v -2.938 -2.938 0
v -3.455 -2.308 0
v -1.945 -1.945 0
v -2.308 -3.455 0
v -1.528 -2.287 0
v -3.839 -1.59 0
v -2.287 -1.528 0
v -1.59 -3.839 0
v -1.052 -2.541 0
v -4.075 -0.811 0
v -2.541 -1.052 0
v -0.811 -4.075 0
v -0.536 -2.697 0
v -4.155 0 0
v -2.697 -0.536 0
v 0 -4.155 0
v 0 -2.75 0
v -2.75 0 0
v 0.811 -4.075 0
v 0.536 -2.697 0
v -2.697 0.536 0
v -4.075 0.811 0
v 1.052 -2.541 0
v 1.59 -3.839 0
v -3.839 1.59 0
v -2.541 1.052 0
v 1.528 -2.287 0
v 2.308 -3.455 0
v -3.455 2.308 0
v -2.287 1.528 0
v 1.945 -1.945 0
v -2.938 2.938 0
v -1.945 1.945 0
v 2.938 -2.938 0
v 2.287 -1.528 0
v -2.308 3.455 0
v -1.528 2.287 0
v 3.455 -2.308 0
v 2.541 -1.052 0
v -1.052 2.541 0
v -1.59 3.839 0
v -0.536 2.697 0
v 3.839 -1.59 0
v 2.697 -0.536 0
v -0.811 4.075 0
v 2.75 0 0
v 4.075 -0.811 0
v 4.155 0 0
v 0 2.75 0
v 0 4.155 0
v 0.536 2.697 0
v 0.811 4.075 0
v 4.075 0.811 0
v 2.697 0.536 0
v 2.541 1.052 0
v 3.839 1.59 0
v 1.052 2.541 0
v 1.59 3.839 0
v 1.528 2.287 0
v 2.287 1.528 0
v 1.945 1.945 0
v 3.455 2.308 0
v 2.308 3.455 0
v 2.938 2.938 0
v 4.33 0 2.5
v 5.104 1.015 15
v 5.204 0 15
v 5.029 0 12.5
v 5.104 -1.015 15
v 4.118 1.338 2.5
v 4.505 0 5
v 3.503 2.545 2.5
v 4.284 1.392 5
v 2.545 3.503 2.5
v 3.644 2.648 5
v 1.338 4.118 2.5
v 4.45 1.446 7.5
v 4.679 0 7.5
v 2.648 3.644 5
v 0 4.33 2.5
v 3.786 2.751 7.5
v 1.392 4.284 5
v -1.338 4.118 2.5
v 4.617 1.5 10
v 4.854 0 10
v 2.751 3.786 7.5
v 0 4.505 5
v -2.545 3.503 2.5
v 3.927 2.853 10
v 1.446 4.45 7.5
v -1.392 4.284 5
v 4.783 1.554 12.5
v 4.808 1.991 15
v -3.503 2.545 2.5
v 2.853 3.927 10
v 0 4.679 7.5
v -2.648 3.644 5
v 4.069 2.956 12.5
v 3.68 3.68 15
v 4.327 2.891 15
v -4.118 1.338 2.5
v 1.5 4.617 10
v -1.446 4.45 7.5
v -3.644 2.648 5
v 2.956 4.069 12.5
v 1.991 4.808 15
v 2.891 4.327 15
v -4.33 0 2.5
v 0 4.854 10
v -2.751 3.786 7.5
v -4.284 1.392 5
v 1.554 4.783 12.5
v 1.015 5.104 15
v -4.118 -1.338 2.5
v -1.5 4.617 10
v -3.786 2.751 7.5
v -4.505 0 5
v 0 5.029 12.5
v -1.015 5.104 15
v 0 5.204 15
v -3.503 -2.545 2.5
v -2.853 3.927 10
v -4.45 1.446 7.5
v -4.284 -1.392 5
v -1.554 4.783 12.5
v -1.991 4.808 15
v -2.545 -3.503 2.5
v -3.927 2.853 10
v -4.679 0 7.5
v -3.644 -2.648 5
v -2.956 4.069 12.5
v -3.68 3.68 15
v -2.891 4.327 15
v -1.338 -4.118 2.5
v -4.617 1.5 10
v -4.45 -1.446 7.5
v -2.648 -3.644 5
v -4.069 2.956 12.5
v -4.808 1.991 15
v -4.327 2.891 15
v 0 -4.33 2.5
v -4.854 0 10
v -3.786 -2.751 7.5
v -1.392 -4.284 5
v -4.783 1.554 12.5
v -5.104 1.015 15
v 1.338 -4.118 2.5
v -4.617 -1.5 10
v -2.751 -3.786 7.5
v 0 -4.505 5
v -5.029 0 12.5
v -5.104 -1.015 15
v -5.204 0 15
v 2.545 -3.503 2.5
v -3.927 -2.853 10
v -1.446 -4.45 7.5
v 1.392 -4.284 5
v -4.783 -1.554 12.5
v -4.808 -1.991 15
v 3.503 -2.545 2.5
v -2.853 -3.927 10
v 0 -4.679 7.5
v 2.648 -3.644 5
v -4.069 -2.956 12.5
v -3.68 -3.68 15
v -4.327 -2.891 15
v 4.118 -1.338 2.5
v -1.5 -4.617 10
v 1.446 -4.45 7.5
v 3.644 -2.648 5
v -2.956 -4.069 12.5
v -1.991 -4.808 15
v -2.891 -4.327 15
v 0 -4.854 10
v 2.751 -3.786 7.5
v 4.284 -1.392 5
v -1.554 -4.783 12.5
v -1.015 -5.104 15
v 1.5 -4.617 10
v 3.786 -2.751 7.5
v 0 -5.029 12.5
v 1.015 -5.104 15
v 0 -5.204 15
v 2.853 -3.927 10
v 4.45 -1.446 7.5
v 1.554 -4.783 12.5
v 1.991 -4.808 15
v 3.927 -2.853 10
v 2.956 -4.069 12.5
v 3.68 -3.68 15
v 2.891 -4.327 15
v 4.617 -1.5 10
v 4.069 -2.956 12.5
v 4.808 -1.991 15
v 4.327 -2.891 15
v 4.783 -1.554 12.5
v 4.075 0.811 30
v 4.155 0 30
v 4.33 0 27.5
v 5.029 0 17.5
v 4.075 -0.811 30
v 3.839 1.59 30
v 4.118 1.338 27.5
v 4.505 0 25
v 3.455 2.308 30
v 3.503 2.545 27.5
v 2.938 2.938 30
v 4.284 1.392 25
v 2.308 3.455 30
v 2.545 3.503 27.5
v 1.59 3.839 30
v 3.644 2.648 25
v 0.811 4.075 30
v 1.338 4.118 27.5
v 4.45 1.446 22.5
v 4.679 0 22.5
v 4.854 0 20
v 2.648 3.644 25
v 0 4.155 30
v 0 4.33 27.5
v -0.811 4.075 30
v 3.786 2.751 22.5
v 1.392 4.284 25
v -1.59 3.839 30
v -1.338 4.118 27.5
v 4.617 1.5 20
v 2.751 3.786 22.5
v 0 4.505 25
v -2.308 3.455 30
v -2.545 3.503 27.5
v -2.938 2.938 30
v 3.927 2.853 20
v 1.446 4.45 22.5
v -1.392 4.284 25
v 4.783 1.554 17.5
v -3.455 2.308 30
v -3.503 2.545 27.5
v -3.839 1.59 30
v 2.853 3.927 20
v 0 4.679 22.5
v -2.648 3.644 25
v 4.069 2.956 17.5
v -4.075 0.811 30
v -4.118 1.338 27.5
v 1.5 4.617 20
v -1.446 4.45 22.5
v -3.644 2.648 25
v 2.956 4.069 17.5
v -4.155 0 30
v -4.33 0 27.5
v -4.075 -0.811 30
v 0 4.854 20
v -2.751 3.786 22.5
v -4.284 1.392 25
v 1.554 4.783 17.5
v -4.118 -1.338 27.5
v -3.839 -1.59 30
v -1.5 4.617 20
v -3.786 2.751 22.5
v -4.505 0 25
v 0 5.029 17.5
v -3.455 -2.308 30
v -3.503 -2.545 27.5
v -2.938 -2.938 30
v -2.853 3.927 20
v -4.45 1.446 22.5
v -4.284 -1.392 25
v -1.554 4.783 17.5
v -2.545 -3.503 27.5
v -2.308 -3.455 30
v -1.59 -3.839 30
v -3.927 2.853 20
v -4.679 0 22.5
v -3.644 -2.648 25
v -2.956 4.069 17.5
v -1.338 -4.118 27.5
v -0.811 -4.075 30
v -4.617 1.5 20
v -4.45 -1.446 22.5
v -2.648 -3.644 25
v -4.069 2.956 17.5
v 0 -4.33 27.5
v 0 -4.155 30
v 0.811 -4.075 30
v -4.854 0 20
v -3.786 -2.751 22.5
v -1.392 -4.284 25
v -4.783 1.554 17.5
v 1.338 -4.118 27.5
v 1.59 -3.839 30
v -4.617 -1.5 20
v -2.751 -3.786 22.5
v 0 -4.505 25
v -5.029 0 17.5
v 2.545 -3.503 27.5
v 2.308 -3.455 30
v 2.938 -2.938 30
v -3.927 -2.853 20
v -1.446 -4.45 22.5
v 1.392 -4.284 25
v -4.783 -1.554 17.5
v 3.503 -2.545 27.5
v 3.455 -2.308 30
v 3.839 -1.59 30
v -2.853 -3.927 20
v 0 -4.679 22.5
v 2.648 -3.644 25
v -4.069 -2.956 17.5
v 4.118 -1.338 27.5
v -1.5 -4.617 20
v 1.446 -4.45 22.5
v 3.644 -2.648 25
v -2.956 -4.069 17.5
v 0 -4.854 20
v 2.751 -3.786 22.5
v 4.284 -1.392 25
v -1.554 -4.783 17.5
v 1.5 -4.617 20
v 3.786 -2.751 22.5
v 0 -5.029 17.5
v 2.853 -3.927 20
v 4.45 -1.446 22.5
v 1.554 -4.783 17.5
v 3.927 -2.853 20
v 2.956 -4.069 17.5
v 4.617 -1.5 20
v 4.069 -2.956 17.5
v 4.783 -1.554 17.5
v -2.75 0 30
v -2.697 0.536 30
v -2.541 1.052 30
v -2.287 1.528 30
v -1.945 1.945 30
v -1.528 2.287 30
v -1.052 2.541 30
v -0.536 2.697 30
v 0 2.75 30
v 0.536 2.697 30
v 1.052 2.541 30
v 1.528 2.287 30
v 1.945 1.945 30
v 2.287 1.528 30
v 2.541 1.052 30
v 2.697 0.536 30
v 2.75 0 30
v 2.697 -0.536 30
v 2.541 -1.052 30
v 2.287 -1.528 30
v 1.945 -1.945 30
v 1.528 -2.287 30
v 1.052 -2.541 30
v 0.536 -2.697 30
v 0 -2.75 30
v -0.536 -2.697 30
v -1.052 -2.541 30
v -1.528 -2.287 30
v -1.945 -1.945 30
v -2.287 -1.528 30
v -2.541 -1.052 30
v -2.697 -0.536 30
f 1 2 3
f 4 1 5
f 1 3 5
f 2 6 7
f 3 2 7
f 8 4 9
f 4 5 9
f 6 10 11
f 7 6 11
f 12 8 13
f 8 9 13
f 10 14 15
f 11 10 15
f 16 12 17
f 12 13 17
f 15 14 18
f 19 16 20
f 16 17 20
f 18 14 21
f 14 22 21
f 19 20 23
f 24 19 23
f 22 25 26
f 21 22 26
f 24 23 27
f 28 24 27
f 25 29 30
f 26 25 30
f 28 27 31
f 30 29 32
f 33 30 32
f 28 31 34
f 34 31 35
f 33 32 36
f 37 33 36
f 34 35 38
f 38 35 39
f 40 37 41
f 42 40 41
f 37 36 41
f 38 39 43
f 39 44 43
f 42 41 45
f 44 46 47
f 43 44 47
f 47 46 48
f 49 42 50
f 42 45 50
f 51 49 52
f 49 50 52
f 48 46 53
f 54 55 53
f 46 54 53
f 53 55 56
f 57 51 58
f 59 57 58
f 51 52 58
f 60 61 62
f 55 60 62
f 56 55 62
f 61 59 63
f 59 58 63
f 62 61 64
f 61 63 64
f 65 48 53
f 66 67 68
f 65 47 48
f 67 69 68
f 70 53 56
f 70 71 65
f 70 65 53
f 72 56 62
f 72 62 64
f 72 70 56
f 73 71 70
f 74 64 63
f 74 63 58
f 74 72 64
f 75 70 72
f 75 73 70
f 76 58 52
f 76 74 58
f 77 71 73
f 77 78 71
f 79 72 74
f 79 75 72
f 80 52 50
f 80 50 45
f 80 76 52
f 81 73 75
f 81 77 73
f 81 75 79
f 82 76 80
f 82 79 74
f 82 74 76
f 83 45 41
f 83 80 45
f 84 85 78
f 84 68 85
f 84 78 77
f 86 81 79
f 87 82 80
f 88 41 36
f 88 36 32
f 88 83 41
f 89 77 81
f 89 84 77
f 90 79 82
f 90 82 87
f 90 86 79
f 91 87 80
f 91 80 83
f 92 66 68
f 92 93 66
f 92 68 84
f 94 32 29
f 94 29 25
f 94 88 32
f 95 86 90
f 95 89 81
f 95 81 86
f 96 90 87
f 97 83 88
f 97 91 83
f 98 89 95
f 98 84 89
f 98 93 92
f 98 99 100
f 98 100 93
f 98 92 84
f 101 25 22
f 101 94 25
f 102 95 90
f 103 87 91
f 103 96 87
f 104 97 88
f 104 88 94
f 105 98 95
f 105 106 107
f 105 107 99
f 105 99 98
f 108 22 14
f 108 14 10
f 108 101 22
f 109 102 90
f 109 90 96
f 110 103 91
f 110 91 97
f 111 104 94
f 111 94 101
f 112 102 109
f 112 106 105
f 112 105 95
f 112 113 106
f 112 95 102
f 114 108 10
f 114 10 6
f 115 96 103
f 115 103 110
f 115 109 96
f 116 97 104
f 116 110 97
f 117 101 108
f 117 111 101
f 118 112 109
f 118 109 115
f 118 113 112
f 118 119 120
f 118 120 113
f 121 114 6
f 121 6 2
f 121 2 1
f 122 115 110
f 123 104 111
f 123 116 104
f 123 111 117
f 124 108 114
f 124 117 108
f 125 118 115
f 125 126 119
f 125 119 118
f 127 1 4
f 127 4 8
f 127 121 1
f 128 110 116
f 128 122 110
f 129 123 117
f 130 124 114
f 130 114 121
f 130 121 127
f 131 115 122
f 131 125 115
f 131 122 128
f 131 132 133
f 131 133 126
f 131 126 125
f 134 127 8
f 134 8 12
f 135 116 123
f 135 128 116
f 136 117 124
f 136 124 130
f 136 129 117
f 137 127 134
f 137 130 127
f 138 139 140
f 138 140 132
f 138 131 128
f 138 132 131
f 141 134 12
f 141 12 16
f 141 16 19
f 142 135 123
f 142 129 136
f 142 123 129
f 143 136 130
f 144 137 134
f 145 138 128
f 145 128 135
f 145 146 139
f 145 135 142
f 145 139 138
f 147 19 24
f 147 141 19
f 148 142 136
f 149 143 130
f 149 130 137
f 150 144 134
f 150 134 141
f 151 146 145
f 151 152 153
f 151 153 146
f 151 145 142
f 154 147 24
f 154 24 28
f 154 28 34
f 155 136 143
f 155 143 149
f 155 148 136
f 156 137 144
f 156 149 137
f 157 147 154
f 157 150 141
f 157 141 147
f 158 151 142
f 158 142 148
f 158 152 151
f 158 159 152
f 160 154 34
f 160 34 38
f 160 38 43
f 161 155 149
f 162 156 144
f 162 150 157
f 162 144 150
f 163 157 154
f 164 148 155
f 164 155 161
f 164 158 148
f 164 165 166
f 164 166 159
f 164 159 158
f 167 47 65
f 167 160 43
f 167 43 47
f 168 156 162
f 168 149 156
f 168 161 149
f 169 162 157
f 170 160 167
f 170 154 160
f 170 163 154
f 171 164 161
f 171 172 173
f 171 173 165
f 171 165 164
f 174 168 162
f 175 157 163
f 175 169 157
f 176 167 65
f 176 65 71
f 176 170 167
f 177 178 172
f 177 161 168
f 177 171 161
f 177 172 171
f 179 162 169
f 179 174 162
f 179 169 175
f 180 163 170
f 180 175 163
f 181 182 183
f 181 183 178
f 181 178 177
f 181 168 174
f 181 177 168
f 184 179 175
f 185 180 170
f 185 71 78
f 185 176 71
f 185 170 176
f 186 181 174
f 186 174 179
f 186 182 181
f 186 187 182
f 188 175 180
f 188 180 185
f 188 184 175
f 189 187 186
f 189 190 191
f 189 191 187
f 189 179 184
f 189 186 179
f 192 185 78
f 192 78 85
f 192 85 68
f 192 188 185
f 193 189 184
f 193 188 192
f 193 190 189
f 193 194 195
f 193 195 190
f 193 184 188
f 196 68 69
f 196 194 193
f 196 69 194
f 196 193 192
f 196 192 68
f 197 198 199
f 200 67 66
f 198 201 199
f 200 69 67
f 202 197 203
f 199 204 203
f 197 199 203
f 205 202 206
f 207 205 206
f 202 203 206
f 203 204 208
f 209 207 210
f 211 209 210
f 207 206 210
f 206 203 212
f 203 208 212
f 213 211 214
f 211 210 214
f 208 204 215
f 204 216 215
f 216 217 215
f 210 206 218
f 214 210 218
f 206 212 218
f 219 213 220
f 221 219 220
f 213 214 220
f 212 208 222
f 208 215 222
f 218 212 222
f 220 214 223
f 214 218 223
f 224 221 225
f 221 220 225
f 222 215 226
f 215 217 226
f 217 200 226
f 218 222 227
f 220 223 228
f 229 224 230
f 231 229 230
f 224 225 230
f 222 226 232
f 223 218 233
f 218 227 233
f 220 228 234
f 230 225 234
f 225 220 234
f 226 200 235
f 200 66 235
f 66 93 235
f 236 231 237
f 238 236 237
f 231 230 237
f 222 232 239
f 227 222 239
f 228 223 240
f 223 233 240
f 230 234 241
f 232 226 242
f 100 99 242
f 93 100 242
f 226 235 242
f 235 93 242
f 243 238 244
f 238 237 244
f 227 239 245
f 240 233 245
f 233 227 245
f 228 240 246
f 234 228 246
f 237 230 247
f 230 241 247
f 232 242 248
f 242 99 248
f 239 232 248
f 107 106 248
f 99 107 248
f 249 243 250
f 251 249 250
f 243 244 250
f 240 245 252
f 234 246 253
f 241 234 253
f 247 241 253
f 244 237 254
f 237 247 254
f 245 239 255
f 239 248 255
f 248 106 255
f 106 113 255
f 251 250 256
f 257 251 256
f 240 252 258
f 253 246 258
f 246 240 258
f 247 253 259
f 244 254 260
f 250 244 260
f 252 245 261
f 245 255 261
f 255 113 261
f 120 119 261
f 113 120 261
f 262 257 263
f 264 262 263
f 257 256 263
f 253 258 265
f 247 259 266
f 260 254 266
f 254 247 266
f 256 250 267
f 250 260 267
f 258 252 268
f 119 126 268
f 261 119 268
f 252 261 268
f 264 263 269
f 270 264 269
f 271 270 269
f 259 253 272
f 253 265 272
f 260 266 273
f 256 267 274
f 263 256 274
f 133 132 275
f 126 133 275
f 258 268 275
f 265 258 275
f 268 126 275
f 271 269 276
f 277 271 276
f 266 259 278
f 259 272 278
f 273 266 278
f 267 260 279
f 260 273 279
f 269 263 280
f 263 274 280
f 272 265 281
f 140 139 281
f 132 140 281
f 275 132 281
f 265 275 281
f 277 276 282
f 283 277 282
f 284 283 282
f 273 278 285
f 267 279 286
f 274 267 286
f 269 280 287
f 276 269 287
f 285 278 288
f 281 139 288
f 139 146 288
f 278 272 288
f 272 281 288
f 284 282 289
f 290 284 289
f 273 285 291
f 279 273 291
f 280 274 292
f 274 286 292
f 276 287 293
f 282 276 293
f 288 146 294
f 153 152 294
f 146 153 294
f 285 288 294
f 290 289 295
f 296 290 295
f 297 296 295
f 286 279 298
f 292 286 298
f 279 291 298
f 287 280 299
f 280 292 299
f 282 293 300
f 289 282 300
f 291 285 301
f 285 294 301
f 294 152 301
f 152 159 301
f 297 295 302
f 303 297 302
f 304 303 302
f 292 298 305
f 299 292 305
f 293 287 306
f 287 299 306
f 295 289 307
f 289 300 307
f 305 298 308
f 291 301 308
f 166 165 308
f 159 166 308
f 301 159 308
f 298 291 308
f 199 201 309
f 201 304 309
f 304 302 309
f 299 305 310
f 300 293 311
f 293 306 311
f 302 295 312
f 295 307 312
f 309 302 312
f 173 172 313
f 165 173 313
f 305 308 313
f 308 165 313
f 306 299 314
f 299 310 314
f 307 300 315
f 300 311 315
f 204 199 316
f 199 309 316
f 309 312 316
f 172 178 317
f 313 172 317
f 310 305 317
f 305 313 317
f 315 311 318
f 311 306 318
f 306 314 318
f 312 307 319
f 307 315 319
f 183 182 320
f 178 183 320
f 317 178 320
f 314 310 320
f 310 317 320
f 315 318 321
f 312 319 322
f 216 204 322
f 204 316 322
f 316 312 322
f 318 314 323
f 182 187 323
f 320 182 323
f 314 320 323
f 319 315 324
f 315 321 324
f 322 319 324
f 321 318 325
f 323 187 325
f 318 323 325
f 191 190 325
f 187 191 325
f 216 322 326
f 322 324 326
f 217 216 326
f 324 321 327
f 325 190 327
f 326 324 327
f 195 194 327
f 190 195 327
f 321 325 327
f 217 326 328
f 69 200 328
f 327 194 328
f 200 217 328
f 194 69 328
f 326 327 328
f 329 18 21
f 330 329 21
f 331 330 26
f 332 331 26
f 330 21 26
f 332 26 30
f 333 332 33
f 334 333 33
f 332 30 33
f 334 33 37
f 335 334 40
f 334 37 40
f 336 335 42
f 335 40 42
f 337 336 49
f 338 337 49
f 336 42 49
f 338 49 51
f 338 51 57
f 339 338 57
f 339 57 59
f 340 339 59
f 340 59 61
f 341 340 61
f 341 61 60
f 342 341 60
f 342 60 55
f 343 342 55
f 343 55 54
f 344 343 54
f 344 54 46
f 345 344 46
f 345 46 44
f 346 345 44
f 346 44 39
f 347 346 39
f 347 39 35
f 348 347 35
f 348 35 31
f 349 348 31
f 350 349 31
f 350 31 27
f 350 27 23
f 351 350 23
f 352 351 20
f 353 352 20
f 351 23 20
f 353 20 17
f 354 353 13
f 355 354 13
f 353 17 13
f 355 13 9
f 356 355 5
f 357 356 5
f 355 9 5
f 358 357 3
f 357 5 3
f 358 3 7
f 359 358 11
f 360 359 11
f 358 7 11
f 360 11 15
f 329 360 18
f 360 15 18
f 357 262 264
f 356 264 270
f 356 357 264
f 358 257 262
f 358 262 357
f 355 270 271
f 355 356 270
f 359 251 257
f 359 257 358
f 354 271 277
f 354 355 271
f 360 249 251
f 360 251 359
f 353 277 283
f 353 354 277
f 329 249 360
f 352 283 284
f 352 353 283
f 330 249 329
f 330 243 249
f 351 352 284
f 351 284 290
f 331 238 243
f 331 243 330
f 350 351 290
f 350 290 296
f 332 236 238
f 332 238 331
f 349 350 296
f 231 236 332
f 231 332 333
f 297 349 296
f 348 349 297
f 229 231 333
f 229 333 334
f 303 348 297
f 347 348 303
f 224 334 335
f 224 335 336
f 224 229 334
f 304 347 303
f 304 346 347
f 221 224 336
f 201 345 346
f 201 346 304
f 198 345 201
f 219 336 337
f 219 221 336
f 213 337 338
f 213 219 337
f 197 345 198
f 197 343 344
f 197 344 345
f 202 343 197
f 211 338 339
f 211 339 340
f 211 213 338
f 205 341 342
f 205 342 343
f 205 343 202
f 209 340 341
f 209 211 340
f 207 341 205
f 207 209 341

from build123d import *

# Parameters (mm, degrees)
F0_R     = 4.155
F1_DEPTH = 15
F1_TAPER = -4
F4_D     = 5.5


with BuildPart() as f1:
    # F0 (on Top) → F1 (new body)
    with BuildSketch(Plane.XY):
        Circle(F0_R)
    extrude(amount=F1_DEPTH, taper=F1_TAPER)

    # F2: F1 across face


with BuildPart() as f1_1:
    add(f1.part)
    add(f1.part.mirror(Plane.XY.offset(15)))

    # F4 (through all)
    with Locations(Plane.XY.offset(30)):
        with Locations((0, 0)):
            Hole(F4_D / 2)


solid = f1_1.part
